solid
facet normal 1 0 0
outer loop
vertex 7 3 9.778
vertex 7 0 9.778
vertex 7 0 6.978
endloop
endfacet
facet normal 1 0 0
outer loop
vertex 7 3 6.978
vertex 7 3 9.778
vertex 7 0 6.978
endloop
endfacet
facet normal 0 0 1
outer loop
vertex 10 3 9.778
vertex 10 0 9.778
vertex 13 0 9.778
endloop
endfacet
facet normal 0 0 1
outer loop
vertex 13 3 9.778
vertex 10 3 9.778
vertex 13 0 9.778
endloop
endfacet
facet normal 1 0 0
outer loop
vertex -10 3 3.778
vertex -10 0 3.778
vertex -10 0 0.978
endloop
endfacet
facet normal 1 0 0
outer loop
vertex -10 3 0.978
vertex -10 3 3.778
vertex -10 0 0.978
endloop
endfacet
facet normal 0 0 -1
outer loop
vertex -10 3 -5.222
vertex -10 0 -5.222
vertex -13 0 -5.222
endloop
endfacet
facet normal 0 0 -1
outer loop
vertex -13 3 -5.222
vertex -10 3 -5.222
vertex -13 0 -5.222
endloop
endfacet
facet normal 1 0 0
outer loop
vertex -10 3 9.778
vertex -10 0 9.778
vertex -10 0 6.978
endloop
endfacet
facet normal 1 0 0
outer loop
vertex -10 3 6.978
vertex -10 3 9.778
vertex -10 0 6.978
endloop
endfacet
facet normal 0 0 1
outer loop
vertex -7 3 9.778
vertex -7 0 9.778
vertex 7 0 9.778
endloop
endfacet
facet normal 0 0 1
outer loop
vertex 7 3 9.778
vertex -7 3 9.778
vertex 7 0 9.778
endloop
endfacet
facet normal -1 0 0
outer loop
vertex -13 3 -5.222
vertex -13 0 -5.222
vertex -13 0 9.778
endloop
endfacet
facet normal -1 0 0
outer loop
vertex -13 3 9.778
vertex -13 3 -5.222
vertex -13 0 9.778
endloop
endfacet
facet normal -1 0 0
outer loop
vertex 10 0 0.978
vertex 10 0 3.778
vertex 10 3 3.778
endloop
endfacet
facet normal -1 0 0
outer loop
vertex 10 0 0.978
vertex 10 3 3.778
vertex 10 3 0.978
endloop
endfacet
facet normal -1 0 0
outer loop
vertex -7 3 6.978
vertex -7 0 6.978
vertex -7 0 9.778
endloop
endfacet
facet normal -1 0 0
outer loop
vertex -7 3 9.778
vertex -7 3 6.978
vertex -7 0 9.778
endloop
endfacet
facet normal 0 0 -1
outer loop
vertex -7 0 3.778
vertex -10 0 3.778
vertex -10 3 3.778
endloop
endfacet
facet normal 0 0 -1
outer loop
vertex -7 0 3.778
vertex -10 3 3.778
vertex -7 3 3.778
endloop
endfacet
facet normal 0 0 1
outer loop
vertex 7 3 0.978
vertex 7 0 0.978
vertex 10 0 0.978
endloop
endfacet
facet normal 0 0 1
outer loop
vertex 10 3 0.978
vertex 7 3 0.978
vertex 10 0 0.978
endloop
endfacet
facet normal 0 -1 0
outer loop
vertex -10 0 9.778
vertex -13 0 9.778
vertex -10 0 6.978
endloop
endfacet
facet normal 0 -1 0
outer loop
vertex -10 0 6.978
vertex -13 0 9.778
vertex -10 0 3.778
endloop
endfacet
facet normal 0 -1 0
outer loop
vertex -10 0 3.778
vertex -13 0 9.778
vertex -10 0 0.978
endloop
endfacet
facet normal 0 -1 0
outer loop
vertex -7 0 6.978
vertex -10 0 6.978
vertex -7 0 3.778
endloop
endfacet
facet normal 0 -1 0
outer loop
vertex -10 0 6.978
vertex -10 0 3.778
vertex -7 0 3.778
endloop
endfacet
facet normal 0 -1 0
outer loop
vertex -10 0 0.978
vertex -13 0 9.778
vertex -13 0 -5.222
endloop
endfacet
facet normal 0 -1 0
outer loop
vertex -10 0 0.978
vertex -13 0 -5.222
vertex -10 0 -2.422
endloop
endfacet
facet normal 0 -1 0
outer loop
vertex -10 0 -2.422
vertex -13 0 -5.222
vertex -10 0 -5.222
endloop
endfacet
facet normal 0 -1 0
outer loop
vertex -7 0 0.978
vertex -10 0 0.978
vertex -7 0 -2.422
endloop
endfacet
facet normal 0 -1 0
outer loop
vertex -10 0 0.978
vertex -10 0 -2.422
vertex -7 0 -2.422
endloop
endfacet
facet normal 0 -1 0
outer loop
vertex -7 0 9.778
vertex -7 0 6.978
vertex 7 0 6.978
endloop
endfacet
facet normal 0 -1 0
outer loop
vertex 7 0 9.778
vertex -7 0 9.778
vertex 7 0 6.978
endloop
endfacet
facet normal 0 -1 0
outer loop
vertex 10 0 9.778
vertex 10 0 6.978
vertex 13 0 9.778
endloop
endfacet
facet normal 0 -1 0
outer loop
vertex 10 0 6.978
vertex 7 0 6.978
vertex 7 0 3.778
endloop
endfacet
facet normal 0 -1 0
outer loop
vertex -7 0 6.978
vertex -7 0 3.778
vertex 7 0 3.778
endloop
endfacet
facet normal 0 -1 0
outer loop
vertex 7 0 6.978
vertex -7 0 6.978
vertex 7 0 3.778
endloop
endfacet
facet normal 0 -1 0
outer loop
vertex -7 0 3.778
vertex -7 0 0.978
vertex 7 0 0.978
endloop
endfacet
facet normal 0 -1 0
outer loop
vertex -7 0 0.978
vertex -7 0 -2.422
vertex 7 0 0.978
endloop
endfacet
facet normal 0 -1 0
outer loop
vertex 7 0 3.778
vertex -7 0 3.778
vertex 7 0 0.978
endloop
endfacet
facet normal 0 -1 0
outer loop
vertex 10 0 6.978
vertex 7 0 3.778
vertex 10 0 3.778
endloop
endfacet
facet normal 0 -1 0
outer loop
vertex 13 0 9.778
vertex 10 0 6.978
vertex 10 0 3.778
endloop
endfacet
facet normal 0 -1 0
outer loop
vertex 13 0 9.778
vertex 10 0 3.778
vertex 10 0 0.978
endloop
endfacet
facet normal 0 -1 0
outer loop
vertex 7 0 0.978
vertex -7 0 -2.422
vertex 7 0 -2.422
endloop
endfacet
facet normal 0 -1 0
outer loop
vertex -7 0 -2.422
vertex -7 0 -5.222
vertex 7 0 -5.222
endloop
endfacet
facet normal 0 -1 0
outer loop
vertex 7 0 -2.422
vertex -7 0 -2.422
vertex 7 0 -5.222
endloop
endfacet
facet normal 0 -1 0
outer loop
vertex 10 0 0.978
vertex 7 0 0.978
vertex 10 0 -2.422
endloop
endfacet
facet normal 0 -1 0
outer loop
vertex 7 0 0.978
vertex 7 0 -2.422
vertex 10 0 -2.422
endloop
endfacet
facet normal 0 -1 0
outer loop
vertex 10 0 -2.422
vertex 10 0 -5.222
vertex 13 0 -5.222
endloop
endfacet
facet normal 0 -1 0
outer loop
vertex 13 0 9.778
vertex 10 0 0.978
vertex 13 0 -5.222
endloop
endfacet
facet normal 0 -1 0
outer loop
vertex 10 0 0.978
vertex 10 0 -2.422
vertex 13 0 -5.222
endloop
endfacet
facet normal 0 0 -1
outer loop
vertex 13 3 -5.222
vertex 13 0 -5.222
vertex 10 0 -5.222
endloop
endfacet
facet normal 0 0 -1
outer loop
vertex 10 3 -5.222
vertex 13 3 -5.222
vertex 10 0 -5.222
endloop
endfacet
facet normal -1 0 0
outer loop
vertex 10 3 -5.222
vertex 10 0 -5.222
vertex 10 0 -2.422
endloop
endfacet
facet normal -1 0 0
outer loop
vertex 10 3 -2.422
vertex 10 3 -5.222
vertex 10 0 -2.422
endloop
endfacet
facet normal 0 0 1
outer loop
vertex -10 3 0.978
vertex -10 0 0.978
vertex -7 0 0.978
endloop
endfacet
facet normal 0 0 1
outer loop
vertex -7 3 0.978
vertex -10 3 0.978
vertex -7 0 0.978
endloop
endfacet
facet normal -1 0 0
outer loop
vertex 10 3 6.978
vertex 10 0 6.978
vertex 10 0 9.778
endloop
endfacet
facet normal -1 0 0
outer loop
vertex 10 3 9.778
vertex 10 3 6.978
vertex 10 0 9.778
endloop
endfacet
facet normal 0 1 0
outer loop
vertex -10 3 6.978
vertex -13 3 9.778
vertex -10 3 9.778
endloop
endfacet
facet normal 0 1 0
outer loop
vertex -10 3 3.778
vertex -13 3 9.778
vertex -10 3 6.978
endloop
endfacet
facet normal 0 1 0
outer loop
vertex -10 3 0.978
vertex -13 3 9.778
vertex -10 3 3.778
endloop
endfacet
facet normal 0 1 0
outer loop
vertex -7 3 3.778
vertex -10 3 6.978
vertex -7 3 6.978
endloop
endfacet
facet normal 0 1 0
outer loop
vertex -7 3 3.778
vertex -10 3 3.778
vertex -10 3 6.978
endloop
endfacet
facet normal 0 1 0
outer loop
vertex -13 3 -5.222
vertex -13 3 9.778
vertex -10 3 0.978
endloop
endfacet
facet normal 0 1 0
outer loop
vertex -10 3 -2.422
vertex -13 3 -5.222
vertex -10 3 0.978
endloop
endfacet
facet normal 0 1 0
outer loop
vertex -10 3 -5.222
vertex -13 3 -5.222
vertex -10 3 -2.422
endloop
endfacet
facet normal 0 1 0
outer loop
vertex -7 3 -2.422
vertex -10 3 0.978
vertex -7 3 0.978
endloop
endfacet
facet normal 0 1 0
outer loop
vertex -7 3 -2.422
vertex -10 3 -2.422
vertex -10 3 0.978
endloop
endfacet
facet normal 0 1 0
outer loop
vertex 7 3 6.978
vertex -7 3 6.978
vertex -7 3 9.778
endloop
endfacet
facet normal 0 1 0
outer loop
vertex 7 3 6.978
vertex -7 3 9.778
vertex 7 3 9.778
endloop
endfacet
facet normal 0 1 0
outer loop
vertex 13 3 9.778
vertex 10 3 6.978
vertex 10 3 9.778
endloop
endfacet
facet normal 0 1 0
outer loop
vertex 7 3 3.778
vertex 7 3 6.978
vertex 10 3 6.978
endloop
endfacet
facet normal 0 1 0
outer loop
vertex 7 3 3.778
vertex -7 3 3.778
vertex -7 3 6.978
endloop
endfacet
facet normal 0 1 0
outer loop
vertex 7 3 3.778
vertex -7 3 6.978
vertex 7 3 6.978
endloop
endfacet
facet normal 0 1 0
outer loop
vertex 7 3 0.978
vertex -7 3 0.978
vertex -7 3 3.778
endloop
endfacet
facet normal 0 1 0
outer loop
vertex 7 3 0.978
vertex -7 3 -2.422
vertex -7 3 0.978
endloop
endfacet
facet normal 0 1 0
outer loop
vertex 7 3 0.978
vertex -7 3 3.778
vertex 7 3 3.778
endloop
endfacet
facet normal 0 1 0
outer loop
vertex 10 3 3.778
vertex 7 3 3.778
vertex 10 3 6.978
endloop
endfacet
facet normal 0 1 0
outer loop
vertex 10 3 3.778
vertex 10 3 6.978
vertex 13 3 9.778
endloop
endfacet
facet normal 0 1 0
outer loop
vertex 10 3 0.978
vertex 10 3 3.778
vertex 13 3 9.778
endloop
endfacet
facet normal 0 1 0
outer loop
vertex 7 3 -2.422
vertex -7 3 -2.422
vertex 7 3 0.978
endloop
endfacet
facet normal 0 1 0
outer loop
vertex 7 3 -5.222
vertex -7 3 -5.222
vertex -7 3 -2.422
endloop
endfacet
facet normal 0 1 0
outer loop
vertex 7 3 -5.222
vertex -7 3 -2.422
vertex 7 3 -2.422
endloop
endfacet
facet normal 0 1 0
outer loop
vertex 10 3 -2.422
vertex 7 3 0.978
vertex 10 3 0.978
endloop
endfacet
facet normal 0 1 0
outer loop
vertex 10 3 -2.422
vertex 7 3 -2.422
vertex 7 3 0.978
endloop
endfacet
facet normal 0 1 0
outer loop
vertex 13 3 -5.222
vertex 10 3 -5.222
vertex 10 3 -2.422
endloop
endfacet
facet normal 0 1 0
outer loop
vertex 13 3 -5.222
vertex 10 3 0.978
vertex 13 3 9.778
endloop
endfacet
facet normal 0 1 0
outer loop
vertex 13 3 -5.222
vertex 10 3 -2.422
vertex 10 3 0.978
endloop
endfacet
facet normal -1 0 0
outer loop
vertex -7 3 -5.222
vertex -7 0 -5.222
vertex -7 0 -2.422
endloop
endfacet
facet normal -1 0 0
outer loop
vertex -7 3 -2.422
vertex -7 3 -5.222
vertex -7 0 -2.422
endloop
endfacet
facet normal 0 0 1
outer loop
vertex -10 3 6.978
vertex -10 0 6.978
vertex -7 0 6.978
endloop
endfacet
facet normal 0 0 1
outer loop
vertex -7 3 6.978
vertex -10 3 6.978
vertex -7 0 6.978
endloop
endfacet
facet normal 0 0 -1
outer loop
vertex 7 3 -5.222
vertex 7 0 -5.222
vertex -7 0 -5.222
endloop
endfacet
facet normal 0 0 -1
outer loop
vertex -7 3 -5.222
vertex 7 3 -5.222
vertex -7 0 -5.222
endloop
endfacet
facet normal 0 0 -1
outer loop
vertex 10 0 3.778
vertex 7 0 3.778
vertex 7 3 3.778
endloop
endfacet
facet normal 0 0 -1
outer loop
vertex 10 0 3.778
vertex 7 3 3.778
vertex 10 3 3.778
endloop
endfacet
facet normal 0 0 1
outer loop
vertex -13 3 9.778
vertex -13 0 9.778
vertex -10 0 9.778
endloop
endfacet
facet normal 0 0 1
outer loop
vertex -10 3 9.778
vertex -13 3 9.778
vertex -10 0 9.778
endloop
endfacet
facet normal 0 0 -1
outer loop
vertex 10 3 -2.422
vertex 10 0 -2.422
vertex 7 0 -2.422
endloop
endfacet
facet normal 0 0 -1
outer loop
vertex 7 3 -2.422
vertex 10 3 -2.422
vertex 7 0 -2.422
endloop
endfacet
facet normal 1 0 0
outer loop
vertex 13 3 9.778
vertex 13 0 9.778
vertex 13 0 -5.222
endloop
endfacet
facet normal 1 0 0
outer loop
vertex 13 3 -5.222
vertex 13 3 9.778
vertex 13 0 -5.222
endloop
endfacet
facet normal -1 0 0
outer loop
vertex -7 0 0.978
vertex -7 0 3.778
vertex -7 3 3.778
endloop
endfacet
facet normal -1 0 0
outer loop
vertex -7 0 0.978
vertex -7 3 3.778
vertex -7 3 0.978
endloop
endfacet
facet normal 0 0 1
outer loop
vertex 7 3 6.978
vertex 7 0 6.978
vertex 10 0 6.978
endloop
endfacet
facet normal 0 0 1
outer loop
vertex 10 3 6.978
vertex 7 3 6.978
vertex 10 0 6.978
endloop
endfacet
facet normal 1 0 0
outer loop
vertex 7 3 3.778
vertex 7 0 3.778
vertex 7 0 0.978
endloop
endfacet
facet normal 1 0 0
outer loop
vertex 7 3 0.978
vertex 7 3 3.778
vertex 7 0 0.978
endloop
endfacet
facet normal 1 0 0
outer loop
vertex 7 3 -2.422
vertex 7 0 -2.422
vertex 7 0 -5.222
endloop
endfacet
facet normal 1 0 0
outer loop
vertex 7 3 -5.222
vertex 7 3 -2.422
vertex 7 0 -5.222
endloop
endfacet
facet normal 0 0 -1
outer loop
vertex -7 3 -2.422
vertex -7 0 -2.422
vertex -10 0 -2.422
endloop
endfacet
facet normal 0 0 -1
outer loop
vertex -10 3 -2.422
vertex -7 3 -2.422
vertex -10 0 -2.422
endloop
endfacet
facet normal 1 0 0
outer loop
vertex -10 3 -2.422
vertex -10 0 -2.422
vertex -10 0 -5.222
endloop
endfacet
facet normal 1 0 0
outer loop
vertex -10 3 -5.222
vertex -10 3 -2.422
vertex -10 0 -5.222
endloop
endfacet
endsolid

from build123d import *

# Parameters (mm, degrees)
SKETCH1_W           = 3
SKETCH1_H           = 2.8
BOSS_EXTRUDE1_DEPTH = 3


with BuildPart() as part:
    # Sketch1 → Boss-Extrude1 (new body)
    with BuildSketch(Plane(origin=(0, 0, 0), x_dir=(1, 0, 0), z_dir=(0, 1, 0))):
        Polygon((-10, -6.977624818), (-7, -6.977624818), (-7, -9.777624818), (7, -9.777624818), (7, -6.977624818), (10, -6.977624818), (10, -9.777624818), (13, -9.777624818), (13, 5.222375182), (10, 5.222375182), (10, 2.422375182), (7, 2.422375182), (7, 5.222375182), (-7, 5.222375182), (-7, 2.422375182), (-10, 2.422375182), (-10, 5.222375182), (-13, 5.222375182), (-13, -9.777624818), (-10, -9.777624818), align=None)
        with Locations((-8.5, -2.377624818)):
            Rectangle(SKETCH1_W, SKETCH1_H, mode=Mode.SUBTRACT)
        with Locations((8.5, -2.377624818)):
            Rectangle(SKETCH1_W, SKETCH1_H, mode=Mode.SUBTRACT)
    extrude(amount=BOSS_EXTRUDE1_DEPTH)


solid = part.part
